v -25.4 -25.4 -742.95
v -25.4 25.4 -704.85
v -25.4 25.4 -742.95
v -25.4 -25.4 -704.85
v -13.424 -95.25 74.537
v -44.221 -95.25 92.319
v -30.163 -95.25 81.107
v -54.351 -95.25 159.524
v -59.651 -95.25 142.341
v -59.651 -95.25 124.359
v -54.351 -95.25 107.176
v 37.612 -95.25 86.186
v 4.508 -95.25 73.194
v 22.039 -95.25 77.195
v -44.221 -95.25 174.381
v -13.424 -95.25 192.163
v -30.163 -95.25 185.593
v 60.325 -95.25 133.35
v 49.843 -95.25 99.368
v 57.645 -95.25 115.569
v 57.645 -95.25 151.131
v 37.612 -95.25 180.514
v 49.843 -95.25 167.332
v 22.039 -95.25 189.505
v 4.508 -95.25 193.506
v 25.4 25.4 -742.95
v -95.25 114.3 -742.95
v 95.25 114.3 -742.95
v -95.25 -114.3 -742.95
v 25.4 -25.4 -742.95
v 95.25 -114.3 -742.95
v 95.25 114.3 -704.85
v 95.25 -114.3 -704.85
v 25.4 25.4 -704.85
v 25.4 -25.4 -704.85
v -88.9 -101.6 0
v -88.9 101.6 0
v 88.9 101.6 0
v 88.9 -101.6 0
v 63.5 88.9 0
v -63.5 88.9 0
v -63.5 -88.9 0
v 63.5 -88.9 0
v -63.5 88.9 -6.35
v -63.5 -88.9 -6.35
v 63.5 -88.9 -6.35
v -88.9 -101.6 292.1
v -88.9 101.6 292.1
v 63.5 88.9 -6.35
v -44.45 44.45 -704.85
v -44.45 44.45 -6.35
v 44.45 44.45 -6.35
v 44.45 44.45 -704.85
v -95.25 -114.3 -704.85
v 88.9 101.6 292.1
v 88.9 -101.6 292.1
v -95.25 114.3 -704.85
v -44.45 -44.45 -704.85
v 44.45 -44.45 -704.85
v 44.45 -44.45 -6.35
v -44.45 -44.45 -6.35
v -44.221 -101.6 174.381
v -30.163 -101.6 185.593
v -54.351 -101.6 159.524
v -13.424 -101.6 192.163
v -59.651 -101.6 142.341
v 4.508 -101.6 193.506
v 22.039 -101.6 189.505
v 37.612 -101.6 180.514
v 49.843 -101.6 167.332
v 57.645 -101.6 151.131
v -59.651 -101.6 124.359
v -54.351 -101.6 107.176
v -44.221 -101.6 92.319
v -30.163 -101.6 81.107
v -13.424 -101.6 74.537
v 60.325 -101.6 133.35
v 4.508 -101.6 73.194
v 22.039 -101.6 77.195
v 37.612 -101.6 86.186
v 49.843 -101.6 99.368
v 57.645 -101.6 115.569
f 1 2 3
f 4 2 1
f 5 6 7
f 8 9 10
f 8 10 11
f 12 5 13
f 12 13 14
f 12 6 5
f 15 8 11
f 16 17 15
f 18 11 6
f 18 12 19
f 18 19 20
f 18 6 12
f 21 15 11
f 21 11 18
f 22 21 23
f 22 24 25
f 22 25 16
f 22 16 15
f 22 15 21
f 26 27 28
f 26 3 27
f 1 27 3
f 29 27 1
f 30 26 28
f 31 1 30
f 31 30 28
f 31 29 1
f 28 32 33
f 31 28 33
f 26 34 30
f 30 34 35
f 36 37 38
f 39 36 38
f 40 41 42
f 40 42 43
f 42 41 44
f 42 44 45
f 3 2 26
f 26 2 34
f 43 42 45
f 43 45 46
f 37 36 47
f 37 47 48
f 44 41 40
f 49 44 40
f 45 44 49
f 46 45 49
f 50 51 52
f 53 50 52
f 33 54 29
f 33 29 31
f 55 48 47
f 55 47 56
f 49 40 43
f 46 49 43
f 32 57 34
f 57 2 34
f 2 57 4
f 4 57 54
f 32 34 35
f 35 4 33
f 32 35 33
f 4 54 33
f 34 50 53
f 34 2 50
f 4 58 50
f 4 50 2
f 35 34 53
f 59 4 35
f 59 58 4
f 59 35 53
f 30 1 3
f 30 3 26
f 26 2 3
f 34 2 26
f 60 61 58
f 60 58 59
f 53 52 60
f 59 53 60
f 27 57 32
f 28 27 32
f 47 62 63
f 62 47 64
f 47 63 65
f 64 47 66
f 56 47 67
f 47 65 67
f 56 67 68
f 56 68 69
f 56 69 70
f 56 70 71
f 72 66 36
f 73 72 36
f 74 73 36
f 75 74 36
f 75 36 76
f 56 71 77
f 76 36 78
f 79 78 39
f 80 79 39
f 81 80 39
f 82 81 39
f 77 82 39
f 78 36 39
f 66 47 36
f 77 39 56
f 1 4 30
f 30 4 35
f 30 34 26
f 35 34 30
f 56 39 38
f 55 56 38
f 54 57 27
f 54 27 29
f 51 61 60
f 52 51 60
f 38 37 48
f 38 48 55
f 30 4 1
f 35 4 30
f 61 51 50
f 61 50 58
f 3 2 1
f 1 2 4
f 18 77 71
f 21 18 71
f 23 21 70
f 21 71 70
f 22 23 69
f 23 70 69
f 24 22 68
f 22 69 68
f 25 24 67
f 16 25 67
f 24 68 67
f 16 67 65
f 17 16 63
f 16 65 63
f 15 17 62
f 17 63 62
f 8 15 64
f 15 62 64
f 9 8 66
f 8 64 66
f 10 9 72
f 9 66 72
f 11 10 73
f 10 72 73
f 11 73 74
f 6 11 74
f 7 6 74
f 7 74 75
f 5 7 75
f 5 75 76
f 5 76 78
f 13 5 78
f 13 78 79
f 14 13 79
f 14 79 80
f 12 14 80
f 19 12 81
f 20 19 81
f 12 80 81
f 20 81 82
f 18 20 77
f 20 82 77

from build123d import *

# Parameters (mm, degrees)
F0_W      = 177.8
F0_H      = 203.2
F1_DEPTH  = 292.1
F6_R      = 60.325
F2_DEPTH  = 6.35
F3_W      = 127
F3_H      = 177.8
F7_DEPTH  = 6.35
F8_W      = 88.9
F8_H      = 88.9
F9_DEPTH  = 698.5
F4_W      = 50.8
F4_H      = 50.8
F10_DEPTH = 38.1
F5_W      = 190.5
F5_H      = 228.6
F5_W_2    = 50.8
F5_H_2    = 50.8
F11_DEPTH = 38.1


with BuildPart() as f1:
    # F0 (on Top) → F1 (new body)
    with BuildSketch(Plane.XY):
        Rectangle(F0_W, F0_H)
    extrude(amount=F1_DEPTH)

    # F6 (on face) → F2 (cut)
    with BuildSketch(Plane.XZ.offset(101.6)):
        with Locations((0, 133.35)):
            Circle(F6_R)
    extrude(amount=-F2_DEPTH, mode=Mode.SUBTRACT)


with BuildPart() as f7:
    # F3 (on face) → F7 (new body)
    with BuildSketch(Plane(origin=(0, 0, 0), x_dir=(1, 0, 0), z_dir=(0, 0, -1))):
        Rectangle(F3_W, F3_H)
    extrude(amount=F7_DEPTH)


with BuildPart() as f9:
    # F8 (on face) → F9 (new body)
    with BuildSketch(Plane(origin=(0, 0, -6.35), x_dir=(1, 0, 0), z_dir=(0, 0, -1))):
        Rectangle(F8_W, F8_H)
    extrude(amount=F9_DEPTH)

    # F4 (on face) → F10 (join)
    with BuildSketch(Plane(origin=(0, 0, -704.85), x_dir=(1, 0, 0), z_dir=(0, 0, -1))):
        Rectangle(F4_W, F4_H)
    extrude(amount=F10_DEPTH)


with BuildPart() as f11:
    # F5 (on face) → F11 (new body, through all)
    with BuildSketch(Plane(origin=(0, 0, -704.85), x_dir=(1, 0, 0), z_dir=(0, 0, -1))):
        Rectangle(F5_W, F5_H)
        Rectangle(F5_W_2, F5_H_2, mode=Mode.SUBTRACT)
    extrude(amount=F11_DEPTH)


solid = Compound([f1.part, f7.part, f9.part, f11.part])
